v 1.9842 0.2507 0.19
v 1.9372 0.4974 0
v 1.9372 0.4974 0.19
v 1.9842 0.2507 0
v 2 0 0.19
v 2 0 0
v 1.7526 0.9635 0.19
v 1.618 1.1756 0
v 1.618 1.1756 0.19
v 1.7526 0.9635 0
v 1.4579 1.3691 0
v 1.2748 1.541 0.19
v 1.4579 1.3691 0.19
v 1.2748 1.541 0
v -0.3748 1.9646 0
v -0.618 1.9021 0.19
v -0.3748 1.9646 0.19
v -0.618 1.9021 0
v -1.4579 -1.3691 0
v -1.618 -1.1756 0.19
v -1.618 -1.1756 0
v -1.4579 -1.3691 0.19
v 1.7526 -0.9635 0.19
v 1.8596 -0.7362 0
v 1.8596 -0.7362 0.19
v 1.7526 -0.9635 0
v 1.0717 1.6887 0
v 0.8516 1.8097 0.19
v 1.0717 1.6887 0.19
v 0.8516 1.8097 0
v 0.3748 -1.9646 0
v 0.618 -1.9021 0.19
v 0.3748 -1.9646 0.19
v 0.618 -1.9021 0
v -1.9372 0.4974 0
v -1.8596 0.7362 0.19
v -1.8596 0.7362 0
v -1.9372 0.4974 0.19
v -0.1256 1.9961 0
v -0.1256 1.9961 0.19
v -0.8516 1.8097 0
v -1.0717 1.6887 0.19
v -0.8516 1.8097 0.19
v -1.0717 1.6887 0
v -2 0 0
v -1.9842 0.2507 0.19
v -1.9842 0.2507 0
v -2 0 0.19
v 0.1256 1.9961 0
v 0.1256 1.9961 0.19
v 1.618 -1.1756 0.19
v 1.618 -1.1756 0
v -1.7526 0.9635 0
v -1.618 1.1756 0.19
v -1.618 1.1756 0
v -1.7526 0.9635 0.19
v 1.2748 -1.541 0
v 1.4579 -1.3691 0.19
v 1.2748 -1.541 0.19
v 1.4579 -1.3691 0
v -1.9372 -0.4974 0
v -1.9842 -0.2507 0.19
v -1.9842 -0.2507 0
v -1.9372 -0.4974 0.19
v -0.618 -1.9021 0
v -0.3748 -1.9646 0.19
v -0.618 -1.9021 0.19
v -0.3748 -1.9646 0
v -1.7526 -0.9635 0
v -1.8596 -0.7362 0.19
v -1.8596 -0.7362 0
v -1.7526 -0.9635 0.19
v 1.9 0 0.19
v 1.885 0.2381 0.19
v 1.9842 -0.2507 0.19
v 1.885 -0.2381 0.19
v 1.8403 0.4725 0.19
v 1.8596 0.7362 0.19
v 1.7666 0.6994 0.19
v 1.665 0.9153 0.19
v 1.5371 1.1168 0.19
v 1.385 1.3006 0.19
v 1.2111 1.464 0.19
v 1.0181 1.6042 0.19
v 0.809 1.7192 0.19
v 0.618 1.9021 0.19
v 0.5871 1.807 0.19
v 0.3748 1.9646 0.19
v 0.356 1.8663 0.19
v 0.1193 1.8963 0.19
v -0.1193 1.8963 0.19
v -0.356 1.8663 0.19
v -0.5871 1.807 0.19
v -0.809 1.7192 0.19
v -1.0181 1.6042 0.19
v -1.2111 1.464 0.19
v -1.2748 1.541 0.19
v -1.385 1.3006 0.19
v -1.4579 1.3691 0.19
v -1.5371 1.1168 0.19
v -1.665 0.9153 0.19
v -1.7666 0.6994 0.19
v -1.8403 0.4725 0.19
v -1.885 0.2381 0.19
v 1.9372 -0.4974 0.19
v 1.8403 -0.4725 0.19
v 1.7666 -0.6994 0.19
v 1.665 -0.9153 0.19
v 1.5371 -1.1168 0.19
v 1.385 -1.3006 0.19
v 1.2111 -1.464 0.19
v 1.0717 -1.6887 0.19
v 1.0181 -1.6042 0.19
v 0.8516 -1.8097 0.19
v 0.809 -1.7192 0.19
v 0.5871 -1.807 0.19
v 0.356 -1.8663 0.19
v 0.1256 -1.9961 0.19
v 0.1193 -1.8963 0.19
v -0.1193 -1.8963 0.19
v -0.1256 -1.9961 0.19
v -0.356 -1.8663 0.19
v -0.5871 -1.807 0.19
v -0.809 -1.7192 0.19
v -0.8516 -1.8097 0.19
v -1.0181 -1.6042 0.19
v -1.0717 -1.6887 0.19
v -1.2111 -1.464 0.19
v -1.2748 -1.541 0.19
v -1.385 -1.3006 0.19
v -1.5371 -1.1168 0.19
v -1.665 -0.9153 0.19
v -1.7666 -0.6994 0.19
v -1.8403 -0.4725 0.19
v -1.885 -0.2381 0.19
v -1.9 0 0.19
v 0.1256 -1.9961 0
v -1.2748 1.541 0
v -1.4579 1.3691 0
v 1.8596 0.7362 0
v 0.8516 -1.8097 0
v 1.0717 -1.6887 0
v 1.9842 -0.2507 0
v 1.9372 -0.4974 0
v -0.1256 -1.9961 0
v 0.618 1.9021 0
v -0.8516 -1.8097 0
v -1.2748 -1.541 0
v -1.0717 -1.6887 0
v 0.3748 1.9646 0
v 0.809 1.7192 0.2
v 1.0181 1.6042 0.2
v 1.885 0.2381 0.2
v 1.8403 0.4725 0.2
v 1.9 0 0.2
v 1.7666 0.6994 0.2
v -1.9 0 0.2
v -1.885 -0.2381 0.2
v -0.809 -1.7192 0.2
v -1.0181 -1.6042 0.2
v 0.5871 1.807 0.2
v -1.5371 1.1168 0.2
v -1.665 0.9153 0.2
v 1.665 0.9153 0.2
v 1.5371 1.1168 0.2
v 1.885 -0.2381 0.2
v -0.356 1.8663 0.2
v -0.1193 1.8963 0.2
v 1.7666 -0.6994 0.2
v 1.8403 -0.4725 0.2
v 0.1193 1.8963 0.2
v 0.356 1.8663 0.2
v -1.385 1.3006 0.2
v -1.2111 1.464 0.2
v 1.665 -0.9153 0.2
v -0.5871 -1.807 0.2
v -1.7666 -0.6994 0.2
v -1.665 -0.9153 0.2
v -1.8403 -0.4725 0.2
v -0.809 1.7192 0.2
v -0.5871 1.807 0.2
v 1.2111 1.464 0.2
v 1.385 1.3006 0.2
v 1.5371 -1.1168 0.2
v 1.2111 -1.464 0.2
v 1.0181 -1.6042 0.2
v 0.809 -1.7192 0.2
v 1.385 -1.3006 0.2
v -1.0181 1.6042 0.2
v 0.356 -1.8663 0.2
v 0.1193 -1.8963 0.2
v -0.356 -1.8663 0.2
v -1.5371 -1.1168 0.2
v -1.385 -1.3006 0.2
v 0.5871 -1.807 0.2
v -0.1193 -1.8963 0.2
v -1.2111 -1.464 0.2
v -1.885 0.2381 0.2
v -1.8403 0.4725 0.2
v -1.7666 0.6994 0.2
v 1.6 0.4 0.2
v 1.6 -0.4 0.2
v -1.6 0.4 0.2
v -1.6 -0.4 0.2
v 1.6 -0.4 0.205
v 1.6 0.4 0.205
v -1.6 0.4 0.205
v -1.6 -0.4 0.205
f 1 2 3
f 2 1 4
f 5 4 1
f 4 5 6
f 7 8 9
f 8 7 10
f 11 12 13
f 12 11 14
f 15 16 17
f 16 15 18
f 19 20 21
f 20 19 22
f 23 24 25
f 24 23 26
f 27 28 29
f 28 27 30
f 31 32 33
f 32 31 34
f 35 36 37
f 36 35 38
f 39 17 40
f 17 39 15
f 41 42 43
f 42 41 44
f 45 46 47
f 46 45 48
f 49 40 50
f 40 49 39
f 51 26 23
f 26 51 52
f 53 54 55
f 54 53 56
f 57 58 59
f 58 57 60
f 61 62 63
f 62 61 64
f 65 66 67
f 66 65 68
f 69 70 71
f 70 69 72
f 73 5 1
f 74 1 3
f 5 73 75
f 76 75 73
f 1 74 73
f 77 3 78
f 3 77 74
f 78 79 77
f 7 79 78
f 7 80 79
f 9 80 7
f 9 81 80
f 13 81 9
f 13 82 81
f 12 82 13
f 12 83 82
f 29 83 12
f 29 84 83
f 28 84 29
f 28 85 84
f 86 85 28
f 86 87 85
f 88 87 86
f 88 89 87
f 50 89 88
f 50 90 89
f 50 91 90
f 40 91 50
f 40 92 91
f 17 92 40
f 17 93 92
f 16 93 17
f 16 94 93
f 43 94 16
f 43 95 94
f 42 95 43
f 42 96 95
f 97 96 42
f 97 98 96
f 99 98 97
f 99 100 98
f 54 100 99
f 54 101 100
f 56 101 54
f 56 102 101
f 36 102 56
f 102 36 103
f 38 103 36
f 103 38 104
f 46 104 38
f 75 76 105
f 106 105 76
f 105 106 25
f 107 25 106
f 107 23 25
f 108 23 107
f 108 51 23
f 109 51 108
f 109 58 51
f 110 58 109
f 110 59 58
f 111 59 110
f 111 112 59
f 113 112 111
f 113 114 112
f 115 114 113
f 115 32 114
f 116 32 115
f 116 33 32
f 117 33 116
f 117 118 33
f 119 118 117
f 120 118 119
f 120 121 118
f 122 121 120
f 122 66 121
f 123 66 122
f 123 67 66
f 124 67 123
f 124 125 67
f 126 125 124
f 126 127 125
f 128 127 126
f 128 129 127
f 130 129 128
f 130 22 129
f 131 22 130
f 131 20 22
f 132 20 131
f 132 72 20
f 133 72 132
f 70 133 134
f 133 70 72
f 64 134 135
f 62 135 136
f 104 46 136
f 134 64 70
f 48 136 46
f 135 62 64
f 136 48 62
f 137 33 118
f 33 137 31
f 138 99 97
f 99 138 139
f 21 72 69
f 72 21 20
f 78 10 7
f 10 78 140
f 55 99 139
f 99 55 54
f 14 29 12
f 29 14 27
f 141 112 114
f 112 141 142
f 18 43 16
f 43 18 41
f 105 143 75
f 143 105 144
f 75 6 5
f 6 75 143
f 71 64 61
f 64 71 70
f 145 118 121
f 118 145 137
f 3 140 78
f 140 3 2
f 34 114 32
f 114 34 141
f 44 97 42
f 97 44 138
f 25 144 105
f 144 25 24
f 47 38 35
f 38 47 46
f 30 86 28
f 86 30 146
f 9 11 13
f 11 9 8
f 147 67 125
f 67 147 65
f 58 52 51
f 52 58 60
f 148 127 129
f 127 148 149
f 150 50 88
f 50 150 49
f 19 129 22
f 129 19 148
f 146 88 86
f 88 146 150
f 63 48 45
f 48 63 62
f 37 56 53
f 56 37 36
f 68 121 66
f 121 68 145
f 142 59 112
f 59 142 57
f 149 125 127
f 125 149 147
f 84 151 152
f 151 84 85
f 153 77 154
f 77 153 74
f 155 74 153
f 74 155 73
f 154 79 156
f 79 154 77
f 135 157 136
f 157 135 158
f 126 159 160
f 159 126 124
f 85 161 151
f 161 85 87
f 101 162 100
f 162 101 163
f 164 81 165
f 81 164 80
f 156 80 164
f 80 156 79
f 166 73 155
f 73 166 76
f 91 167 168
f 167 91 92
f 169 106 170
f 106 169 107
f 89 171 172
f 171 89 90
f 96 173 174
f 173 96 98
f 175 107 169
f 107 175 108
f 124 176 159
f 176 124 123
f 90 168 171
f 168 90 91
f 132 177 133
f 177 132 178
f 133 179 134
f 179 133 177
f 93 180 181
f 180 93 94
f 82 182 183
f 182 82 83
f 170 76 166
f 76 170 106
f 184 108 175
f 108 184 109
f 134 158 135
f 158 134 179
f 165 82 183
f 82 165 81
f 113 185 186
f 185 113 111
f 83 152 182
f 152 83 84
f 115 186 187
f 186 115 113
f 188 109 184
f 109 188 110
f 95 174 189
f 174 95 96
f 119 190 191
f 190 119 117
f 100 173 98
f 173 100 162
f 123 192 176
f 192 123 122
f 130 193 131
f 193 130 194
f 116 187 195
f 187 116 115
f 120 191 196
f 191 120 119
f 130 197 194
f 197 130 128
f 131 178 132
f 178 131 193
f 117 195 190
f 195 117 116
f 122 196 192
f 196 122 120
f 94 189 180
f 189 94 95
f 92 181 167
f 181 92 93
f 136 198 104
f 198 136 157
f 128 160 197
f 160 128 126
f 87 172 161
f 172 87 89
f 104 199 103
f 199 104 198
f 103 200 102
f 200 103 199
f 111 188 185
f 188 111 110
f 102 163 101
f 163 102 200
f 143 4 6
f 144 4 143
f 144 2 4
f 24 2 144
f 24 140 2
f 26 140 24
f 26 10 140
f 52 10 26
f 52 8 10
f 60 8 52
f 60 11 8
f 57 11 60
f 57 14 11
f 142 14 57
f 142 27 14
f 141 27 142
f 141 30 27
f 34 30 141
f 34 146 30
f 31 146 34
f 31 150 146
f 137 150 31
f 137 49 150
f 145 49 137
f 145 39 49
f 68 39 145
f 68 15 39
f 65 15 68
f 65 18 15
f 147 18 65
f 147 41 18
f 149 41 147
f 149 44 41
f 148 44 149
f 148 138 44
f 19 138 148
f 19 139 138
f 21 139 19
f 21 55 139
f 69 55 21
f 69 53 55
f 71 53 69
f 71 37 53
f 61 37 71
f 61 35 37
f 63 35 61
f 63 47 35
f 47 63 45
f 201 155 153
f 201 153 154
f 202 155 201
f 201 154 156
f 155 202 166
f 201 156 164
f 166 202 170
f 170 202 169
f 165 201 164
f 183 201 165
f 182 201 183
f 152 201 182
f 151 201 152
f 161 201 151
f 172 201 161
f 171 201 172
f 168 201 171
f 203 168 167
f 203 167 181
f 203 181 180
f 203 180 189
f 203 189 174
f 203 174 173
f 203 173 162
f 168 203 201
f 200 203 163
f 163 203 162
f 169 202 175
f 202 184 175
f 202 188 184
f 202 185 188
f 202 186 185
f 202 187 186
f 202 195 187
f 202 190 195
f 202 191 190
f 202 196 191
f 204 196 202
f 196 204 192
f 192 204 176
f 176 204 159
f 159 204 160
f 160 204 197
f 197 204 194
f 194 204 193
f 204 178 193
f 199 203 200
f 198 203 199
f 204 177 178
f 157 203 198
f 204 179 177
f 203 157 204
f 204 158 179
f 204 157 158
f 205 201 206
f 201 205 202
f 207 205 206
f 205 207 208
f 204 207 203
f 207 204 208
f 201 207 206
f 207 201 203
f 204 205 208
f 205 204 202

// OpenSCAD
Red_Size = 1.5;


color("gray")
cylinder(h = 0.1, r1 = 2,r2 = 2,$fn = 50);

translate([0,0,0.1])
difference(){
color("red")
cylinder(h = 0.1, r1 = 1.9,r2 = 1.9,$fn = 50);


}


translate([0,0,0.09])
difference(){
color("white")
cylinder(h = 0.1, r1 = 2,r2 = 2,$fn = 50);
cylinder(h = 0.2, r1 = 1.9,r2 = 1.9,$fn = 50);

}

color("white")
translate([0,0,0.09])
translate([0,0,0.09])
cube([3.2,0.8,0.05], center = true);
